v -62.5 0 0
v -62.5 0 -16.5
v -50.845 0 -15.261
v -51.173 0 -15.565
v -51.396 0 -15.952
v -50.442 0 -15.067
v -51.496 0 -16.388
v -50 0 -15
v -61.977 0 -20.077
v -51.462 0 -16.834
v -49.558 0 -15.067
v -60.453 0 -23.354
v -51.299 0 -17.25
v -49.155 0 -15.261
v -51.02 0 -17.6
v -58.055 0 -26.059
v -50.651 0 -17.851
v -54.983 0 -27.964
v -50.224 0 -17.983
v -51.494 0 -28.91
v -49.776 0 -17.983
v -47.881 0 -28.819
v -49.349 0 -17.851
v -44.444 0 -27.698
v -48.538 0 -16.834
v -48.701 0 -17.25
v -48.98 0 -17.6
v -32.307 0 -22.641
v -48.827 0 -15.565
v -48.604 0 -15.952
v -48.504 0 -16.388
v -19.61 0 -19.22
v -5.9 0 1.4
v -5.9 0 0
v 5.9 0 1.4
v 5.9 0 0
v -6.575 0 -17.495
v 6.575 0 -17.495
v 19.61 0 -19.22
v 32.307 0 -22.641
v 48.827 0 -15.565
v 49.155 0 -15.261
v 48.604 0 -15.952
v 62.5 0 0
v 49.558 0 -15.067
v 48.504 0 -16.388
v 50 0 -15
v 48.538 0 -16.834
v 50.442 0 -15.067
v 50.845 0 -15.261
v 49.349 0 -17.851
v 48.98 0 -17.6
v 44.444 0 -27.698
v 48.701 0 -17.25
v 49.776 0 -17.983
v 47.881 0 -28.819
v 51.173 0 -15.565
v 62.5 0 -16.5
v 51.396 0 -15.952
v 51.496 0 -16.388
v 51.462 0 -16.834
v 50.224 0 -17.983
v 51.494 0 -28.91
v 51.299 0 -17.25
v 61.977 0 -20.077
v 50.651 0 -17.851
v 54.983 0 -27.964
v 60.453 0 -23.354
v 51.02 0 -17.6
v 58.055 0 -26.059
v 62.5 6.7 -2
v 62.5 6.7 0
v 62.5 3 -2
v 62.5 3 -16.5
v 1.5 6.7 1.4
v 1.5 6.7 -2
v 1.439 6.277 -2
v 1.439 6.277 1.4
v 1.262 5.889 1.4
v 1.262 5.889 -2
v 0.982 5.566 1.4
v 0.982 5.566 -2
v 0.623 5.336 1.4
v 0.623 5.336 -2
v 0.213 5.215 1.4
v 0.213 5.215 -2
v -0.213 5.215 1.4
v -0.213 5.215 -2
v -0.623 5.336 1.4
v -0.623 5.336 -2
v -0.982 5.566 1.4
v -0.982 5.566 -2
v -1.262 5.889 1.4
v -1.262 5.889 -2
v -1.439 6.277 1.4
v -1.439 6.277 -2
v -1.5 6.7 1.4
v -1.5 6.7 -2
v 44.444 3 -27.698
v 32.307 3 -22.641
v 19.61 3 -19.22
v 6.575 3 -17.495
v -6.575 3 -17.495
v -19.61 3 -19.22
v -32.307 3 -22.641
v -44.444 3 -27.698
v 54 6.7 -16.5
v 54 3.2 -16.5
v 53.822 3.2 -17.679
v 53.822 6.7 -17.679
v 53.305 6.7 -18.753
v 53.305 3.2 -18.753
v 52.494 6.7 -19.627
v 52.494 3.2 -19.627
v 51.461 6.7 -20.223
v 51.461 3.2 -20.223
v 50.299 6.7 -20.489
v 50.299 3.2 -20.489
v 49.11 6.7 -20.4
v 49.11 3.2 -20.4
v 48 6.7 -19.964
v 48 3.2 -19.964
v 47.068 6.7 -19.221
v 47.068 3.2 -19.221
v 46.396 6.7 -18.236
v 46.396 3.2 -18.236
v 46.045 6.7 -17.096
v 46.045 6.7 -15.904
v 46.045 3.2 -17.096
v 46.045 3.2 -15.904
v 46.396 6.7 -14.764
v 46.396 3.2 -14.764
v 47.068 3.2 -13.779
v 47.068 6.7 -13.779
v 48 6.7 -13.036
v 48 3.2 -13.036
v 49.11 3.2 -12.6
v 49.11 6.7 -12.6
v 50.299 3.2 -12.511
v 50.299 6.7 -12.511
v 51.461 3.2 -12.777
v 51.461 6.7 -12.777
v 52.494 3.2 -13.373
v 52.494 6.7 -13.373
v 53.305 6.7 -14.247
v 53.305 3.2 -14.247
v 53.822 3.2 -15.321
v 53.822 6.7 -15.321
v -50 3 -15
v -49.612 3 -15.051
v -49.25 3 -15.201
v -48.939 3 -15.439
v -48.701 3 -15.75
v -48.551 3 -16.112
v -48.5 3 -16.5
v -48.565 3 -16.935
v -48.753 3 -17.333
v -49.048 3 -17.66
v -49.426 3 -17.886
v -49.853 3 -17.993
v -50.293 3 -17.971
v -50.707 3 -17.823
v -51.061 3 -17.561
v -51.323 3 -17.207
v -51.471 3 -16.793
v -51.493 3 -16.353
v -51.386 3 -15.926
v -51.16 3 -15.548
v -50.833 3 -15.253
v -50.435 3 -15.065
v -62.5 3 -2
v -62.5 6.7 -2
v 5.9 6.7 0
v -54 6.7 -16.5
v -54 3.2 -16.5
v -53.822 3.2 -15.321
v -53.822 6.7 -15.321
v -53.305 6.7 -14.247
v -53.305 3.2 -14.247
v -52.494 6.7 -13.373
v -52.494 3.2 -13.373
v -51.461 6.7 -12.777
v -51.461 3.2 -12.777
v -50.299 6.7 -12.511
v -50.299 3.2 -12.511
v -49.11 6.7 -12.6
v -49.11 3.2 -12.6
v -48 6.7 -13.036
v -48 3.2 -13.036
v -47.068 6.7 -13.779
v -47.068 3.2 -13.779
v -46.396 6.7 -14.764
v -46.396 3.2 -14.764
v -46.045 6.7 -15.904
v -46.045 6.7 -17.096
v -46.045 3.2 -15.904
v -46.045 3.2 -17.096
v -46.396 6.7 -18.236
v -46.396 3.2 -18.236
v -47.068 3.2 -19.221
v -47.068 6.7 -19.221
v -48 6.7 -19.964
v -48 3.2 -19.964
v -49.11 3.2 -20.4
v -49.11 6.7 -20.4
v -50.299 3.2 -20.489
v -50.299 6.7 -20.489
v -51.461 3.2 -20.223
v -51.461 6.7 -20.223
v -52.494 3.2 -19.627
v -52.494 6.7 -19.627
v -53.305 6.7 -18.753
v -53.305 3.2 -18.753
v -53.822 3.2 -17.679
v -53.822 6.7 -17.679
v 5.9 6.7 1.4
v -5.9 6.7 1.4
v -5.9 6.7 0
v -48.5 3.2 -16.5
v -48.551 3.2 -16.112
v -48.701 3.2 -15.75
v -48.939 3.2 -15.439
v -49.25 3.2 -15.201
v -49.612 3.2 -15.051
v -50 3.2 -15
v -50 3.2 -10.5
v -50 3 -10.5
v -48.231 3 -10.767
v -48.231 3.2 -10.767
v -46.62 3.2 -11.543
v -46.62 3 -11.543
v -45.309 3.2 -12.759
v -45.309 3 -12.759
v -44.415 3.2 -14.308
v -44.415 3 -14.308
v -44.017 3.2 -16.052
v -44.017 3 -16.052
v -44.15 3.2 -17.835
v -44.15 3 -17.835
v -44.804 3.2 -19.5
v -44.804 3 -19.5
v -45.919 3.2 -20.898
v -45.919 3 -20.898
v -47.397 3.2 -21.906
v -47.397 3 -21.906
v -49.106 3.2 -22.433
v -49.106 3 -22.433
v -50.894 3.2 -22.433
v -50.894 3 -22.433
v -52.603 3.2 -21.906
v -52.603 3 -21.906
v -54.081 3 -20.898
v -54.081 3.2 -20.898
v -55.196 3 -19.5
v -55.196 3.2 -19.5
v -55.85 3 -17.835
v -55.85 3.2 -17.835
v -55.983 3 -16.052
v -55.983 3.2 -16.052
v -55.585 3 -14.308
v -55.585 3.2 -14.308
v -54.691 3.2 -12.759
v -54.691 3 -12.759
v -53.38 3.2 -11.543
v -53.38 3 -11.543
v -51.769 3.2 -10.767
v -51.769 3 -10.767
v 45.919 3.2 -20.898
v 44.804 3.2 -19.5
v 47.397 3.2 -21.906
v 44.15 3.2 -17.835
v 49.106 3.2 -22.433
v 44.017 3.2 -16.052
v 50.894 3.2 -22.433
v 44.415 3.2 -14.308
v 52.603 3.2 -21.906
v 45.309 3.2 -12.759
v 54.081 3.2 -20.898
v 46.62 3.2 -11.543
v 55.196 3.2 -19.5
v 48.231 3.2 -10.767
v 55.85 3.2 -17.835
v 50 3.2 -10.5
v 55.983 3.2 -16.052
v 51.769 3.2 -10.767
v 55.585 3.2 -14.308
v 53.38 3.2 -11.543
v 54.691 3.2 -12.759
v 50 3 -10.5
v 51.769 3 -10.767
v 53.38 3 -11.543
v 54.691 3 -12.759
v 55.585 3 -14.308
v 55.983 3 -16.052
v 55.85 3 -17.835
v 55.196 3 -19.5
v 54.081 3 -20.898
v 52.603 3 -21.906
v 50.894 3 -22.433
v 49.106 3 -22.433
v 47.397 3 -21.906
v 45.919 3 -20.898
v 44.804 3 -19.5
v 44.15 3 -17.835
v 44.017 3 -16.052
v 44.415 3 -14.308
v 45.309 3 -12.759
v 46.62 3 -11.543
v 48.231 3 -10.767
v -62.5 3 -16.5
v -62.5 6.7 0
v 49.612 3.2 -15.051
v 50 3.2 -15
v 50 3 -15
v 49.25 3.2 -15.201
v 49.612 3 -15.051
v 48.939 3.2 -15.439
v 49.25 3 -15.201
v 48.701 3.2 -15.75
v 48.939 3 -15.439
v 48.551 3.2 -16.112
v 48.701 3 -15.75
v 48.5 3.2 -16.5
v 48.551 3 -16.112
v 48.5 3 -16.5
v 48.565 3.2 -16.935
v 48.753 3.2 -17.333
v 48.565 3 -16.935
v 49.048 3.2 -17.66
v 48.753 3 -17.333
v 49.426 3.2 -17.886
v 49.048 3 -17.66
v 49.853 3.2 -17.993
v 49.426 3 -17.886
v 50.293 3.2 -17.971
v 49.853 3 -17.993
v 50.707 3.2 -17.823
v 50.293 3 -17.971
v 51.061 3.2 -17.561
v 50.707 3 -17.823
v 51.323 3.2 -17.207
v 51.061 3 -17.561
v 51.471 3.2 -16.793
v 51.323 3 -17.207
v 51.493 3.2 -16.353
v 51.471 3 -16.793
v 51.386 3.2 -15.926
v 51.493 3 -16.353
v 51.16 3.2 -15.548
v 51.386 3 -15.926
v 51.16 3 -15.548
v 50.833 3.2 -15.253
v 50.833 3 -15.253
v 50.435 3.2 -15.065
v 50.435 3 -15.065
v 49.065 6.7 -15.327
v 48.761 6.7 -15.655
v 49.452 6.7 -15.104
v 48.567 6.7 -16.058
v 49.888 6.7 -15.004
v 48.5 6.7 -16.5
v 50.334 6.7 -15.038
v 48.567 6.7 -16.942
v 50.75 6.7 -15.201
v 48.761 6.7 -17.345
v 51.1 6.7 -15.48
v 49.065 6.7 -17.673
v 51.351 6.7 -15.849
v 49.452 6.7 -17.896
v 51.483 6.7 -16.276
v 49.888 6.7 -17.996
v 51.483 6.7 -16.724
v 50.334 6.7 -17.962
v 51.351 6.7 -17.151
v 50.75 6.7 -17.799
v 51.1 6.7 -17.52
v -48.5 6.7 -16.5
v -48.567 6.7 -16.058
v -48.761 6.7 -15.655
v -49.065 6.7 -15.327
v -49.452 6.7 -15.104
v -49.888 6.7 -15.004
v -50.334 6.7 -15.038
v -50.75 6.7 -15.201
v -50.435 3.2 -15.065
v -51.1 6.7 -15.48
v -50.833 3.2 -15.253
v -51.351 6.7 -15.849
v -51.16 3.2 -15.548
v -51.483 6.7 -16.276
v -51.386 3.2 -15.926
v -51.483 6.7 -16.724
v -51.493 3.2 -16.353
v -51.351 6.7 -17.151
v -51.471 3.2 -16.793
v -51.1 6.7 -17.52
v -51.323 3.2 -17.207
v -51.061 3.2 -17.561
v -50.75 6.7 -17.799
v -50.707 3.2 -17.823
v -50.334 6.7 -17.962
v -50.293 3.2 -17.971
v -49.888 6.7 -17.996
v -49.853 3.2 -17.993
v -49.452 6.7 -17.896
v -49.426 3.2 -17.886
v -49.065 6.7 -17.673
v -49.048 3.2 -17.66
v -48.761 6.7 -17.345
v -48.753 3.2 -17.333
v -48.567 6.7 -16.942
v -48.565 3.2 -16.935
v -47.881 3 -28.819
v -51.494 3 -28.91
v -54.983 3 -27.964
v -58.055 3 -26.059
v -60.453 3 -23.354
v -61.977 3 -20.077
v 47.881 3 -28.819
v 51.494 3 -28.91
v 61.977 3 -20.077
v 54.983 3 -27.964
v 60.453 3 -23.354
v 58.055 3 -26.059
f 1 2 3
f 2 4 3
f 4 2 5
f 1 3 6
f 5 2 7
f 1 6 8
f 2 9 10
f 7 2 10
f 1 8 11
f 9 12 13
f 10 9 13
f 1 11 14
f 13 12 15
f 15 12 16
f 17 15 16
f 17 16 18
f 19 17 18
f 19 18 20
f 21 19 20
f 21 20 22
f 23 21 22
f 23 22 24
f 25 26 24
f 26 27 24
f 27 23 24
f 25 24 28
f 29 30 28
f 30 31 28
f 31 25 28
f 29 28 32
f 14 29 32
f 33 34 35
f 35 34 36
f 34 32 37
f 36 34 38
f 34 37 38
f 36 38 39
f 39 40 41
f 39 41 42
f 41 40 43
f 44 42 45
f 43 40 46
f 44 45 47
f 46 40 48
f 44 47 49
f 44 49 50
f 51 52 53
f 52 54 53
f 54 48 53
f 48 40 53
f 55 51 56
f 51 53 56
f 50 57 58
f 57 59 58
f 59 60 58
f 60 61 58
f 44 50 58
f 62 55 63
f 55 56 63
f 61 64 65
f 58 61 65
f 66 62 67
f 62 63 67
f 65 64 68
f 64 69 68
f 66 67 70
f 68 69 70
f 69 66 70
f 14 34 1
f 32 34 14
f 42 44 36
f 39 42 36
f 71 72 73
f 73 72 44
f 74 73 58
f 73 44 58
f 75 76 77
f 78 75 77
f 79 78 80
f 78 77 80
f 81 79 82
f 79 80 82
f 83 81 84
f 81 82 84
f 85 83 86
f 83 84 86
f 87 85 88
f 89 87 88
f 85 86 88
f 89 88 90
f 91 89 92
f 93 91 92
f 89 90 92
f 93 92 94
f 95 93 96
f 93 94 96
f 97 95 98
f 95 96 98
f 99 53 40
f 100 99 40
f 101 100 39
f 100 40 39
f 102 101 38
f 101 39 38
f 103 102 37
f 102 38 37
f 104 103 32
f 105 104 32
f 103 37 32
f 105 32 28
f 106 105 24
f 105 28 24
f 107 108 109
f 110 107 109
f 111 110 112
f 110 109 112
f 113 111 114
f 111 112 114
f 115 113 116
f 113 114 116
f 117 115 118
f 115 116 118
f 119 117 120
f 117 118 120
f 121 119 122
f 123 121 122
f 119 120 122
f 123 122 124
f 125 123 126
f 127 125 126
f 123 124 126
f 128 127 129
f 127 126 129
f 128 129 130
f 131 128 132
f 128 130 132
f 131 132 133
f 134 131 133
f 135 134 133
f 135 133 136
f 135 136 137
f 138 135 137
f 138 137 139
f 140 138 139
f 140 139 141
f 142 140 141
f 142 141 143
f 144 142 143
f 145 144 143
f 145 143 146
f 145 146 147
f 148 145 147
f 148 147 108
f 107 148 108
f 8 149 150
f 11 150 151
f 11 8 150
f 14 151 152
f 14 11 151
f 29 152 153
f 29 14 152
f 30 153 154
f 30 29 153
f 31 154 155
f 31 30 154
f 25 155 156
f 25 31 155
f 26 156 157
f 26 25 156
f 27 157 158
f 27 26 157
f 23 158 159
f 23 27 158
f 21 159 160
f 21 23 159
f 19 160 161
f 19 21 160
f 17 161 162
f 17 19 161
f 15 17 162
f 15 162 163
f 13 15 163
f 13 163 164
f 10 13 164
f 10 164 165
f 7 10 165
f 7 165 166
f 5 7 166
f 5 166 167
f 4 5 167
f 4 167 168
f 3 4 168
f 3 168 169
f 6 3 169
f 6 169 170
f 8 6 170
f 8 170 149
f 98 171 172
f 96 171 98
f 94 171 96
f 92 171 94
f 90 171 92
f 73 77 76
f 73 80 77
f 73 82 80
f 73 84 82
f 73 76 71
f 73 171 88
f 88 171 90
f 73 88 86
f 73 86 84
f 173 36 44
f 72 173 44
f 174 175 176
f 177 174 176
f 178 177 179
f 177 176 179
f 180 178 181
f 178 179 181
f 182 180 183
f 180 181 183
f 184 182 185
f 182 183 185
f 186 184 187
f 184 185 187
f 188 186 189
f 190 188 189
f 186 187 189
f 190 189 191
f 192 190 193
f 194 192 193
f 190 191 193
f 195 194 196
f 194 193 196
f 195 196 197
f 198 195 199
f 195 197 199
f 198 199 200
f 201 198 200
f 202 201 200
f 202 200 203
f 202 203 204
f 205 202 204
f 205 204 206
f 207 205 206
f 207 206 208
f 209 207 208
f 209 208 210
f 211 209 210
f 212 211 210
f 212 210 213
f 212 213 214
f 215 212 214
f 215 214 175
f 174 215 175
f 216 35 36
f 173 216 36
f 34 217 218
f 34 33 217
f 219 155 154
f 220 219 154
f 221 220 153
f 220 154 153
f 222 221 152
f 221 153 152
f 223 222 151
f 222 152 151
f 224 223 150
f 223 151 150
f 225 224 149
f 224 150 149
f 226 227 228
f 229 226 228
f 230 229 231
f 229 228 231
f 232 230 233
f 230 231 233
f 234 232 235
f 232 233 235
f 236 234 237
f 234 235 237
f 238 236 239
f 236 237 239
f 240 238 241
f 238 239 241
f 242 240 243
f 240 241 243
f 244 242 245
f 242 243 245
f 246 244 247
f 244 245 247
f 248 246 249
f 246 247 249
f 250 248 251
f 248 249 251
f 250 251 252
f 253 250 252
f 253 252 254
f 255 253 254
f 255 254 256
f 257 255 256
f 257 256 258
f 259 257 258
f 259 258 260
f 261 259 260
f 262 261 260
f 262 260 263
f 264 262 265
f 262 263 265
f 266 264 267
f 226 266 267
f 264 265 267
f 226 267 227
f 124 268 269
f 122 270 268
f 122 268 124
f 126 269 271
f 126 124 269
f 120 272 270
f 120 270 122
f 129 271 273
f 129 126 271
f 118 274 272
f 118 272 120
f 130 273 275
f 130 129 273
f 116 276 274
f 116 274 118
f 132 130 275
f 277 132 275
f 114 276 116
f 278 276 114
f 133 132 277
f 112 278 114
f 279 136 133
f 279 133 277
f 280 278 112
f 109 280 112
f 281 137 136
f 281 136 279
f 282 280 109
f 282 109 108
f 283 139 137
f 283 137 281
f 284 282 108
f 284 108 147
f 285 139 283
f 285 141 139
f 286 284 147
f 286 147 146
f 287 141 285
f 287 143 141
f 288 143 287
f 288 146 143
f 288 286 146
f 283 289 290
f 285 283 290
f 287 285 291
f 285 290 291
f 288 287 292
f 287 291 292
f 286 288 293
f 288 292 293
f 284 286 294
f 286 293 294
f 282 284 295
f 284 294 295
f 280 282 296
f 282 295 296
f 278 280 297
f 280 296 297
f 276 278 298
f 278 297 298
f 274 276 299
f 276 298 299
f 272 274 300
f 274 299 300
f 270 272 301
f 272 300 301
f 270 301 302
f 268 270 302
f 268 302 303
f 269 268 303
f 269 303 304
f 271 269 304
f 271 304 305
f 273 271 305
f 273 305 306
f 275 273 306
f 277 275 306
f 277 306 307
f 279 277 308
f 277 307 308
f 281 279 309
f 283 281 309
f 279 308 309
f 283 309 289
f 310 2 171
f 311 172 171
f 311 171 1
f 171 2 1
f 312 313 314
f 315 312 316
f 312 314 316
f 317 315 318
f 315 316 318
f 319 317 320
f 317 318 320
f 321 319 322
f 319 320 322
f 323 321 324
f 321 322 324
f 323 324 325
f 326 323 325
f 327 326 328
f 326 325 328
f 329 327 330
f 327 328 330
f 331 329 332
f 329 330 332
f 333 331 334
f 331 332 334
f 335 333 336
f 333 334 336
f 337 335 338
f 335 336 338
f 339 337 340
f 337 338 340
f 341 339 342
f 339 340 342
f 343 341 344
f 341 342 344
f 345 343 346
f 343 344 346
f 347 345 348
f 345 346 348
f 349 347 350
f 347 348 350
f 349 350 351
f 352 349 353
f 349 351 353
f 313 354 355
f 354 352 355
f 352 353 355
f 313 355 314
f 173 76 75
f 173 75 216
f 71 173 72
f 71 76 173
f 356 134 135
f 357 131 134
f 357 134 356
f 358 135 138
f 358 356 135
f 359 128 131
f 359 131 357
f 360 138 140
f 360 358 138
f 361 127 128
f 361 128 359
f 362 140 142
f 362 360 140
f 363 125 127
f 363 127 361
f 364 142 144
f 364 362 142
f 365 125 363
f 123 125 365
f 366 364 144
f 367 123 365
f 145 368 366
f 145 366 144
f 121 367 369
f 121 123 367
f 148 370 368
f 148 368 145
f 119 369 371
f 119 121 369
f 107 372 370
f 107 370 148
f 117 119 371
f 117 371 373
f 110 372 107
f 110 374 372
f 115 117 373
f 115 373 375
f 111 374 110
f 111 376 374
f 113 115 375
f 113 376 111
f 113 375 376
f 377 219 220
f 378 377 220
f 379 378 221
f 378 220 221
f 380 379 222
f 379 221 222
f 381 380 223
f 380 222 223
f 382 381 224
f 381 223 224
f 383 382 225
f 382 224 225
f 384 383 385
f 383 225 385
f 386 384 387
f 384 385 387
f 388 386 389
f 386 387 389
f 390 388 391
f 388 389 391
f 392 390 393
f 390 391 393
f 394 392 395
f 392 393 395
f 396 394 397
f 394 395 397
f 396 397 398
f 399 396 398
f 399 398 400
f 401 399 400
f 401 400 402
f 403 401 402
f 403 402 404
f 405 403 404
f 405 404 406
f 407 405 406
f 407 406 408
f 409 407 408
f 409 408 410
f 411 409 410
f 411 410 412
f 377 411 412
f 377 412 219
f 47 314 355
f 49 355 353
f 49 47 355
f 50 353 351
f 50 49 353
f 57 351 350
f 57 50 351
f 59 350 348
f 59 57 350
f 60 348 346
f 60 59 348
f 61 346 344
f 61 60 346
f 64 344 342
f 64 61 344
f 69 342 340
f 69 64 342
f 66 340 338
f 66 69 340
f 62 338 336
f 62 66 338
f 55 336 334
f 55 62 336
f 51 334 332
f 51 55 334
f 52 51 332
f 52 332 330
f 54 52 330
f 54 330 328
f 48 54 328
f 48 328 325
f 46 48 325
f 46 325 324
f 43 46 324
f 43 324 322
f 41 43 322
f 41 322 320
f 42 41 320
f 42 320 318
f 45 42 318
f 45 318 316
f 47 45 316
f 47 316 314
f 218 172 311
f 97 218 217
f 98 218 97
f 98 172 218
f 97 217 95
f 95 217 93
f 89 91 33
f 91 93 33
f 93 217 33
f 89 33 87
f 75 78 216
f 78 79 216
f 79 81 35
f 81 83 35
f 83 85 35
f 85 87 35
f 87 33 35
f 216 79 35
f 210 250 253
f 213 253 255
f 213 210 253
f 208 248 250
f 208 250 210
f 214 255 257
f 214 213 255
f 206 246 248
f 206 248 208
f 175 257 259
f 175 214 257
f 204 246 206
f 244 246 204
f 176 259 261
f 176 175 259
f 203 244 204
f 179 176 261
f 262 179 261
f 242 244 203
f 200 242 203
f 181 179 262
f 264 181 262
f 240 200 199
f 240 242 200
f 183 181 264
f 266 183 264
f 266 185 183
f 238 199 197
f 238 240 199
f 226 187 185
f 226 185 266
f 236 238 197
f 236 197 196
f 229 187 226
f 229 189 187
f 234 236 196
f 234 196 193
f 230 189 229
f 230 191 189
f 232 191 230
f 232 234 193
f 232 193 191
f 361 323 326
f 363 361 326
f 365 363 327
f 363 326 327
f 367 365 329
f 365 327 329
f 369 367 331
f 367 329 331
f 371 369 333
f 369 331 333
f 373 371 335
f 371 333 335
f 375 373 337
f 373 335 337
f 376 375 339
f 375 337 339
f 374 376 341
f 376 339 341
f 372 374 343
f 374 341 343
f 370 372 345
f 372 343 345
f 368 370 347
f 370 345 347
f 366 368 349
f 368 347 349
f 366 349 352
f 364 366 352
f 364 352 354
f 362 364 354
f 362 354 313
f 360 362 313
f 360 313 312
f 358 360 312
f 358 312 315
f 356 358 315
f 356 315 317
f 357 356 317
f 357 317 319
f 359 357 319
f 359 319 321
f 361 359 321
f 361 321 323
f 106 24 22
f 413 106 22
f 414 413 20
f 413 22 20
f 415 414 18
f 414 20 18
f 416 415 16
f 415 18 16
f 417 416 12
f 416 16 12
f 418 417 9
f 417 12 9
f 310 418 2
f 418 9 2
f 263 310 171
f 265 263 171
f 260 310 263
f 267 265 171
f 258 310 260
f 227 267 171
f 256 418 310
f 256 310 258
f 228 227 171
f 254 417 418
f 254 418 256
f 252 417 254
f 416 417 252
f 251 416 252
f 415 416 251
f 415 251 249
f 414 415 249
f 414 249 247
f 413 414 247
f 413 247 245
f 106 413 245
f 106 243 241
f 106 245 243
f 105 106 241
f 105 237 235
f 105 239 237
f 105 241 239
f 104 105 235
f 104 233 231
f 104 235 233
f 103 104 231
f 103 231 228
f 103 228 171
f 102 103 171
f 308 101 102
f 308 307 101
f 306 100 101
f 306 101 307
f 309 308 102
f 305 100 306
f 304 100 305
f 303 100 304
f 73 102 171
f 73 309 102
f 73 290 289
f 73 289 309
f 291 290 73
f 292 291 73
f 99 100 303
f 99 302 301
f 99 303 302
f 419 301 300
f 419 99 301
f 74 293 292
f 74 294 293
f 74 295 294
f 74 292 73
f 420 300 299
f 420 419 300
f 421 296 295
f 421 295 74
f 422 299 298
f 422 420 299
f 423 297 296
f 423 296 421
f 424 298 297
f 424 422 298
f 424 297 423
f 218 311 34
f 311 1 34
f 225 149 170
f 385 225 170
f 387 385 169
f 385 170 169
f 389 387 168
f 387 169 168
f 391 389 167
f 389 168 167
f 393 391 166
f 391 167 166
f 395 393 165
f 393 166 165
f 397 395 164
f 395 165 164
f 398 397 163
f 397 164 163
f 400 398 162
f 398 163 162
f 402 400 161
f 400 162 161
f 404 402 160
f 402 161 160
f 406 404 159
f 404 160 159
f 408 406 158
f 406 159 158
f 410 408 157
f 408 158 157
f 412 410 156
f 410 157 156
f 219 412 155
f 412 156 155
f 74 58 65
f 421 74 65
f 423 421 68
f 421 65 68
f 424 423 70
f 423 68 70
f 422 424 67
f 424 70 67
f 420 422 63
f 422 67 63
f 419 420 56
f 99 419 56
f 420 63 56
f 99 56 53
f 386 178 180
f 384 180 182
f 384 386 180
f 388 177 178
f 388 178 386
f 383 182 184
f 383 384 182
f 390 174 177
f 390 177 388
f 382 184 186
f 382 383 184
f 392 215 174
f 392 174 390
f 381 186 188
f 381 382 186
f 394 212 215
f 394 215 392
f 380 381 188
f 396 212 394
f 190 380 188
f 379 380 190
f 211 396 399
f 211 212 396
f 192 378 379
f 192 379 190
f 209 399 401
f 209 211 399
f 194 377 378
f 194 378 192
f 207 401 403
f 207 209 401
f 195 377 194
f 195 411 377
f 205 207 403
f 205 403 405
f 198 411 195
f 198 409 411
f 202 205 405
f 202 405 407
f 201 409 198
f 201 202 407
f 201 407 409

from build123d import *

# Parameters (mm, degrees)
SKETCH1_R           = 1.5
BOSS_EXTRUDE1_DEPTH = 3
BOSS_EXTRUDE2_START = 3
SKETCH1_3_W         = 11.8
SKETCH1_3_H         = 1.4
SKETCH1_3_W_2       = 125
SKETCH1_3_H_2       = 2
BOSS_EXTRUDE2_DEPTH = 3.7
SKETCH2_R           = 1.5
CUT_EXTRUDE1_DEPTH  = 69.411548733
SKETCH3_R           = 6
SKETCH3_R_2         = 1.5
BOSS_EXTRUDE3_DEPTH = 0.2


with BuildPart() as part:
    # Sketch1 → Boss-Extrude1 (new body)
    with BuildSketch(Plane(origin=(0, 0, 0), x_dir=(1, 0, 0), z_dir=(0, 1, 0))):
        with BuildLine():
            Line((-62.5, 0), (-5.9, 0))
            Line((-5.9, 0), (-5.9, -1.4))
            Line((-5.9, -1.4), (5.9, -1.4))
            Line((5.9, -1.4), (5.9, 0))
            Line((5.9, 0), (62.5, 0))
            Line((62.5, 0), (62.5, 16.5))
            ThreePointArc((62.5, 16.5), (56.588078143, 27.122957516), (44.444443779, 27.697579876))
            ThreePointArc((44.444443779, 27.697579876), (-1.61e-07, 17.278221854), (-44.444444068, 27.697580019))
            ThreePointArc((-44.444444068, 27.697580019), (-56.58807828, 27.122957431), (-62.5, 16.5))
            Line((-62.5, 16.5), (-62.5, 0))
        make_face()
        with Locations(Location((50, 16.5, 0), (0, 0, 270))):
            Circle(SKETCH1_R, mode=Mode.SUBTRACT)
        with Locations(Location((-50, 16.5, 0), (0, 0, 270))):
            Circle(SKETCH1_R, mode=Mode.SUBTRACT)
    extrude(amount=BOSS_EXTRUDE1_DEPTH)

    # Sketch1<3> → Boss-Extrude2 (add)
    with BuildSketch(Plane(origin=(0, 0, 0), x_dir=(1, 0, 0), z_dir=(0, 1, 0)).offset(BOSS_EXTRUDE2_START)):
        with BuildLine():
            ThreePointArc((-46, 16.5), (-50, 20.5), (-54, 16.5))
            Line((-54, 16.5), (-51.5, 16.5))
            ThreePointArc((-51.5, 16.5), (-50, 18), (-48.5, 16.5))
            Line((-48.5, 16.5), (-46, 16.5))
        make_face()
        with BuildLine():
            Line((-51.5, 16.5), (-54, 16.5))
            ThreePointArc((-54, 16.5), (-50, 12.5), (-46, 16.5))
            Line((-46, 16.5), (-48.5, 16.5))
            ThreePointArc((-48.5, 16.5), (-50, 15), (-51.5, 16.5))
        make_face()
        with BuildLine():
            ThreePointArc((46, 16.5), (50, 12.5), (54, 16.5))
            Line((54, 16.5), (51.5, 16.5))
            ThreePointArc((51.5, 16.5), (50, 15), (48.5, 16.5))
            Line((48.5, 16.5), (46, 16.5))
        make_face()
        with BuildLine():
            Line((51.5, 16.5), (54, 16.5))
            ThreePointArc((54, 16.5), (50, 20.5), (46, 16.5))
            Line((46, 16.5), (48.5, 16.5))
            ThreePointArc((48.5, 16.5), (50, 18), (51.5, 16.5))
        make_face()
        with Locations((0, -0.7)):
            Rectangle(SKETCH1_3_W, SKETCH1_3_H)
        with Locations((0, 1)):
            Rectangle(SKETCH1_3_W_2, SKETCH1_3_H_2)
    extrude(amount=BOSS_EXTRUDE2_DEPTH)

    # Sketch2 → Cut-Extrude1 (cut, through all)
    with BuildSketch(Plane(origin=(0, 0, -2), x_dir=(-1, 0, 0), z_dir=(0, 0, -1))):
        with Locations((0, 6.7)):
            Circle(SKETCH2_R)
    extrude(amount=-CUT_EXTRUDE1_DEPTH, mode=Mode.SUBTRACT)

    # Sketch3 → Boss-Extrude3 (add)
    with BuildSketch(Plane(origin=(0, 3, 0), x_dir=(1, 0, 0), z_dir=(0, 1, 0))):
        with Locations(Location((-50, 16.5, 0), (0, 0, 270))):
            Circle(SKETCH3_R)
        with Locations(Location((-50, 16.5, 0), (0, 0, 270))):
            Circle(SKETCH3_R_2, mode=Mode.SUBTRACT)
        with Locations(Location((50, 16.5, 0), (0, 0, 270))):
            Circle(SKETCH3_R)
        with Locations(Location((50, 16.5, 0), (0, 0, 270))):
            Circle(SKETCH3_R_2, mode=Mode.SUBTRACT)
    extrude(amount=BOSS_EXTRUDE3_DEPTH)


solid = part.part
